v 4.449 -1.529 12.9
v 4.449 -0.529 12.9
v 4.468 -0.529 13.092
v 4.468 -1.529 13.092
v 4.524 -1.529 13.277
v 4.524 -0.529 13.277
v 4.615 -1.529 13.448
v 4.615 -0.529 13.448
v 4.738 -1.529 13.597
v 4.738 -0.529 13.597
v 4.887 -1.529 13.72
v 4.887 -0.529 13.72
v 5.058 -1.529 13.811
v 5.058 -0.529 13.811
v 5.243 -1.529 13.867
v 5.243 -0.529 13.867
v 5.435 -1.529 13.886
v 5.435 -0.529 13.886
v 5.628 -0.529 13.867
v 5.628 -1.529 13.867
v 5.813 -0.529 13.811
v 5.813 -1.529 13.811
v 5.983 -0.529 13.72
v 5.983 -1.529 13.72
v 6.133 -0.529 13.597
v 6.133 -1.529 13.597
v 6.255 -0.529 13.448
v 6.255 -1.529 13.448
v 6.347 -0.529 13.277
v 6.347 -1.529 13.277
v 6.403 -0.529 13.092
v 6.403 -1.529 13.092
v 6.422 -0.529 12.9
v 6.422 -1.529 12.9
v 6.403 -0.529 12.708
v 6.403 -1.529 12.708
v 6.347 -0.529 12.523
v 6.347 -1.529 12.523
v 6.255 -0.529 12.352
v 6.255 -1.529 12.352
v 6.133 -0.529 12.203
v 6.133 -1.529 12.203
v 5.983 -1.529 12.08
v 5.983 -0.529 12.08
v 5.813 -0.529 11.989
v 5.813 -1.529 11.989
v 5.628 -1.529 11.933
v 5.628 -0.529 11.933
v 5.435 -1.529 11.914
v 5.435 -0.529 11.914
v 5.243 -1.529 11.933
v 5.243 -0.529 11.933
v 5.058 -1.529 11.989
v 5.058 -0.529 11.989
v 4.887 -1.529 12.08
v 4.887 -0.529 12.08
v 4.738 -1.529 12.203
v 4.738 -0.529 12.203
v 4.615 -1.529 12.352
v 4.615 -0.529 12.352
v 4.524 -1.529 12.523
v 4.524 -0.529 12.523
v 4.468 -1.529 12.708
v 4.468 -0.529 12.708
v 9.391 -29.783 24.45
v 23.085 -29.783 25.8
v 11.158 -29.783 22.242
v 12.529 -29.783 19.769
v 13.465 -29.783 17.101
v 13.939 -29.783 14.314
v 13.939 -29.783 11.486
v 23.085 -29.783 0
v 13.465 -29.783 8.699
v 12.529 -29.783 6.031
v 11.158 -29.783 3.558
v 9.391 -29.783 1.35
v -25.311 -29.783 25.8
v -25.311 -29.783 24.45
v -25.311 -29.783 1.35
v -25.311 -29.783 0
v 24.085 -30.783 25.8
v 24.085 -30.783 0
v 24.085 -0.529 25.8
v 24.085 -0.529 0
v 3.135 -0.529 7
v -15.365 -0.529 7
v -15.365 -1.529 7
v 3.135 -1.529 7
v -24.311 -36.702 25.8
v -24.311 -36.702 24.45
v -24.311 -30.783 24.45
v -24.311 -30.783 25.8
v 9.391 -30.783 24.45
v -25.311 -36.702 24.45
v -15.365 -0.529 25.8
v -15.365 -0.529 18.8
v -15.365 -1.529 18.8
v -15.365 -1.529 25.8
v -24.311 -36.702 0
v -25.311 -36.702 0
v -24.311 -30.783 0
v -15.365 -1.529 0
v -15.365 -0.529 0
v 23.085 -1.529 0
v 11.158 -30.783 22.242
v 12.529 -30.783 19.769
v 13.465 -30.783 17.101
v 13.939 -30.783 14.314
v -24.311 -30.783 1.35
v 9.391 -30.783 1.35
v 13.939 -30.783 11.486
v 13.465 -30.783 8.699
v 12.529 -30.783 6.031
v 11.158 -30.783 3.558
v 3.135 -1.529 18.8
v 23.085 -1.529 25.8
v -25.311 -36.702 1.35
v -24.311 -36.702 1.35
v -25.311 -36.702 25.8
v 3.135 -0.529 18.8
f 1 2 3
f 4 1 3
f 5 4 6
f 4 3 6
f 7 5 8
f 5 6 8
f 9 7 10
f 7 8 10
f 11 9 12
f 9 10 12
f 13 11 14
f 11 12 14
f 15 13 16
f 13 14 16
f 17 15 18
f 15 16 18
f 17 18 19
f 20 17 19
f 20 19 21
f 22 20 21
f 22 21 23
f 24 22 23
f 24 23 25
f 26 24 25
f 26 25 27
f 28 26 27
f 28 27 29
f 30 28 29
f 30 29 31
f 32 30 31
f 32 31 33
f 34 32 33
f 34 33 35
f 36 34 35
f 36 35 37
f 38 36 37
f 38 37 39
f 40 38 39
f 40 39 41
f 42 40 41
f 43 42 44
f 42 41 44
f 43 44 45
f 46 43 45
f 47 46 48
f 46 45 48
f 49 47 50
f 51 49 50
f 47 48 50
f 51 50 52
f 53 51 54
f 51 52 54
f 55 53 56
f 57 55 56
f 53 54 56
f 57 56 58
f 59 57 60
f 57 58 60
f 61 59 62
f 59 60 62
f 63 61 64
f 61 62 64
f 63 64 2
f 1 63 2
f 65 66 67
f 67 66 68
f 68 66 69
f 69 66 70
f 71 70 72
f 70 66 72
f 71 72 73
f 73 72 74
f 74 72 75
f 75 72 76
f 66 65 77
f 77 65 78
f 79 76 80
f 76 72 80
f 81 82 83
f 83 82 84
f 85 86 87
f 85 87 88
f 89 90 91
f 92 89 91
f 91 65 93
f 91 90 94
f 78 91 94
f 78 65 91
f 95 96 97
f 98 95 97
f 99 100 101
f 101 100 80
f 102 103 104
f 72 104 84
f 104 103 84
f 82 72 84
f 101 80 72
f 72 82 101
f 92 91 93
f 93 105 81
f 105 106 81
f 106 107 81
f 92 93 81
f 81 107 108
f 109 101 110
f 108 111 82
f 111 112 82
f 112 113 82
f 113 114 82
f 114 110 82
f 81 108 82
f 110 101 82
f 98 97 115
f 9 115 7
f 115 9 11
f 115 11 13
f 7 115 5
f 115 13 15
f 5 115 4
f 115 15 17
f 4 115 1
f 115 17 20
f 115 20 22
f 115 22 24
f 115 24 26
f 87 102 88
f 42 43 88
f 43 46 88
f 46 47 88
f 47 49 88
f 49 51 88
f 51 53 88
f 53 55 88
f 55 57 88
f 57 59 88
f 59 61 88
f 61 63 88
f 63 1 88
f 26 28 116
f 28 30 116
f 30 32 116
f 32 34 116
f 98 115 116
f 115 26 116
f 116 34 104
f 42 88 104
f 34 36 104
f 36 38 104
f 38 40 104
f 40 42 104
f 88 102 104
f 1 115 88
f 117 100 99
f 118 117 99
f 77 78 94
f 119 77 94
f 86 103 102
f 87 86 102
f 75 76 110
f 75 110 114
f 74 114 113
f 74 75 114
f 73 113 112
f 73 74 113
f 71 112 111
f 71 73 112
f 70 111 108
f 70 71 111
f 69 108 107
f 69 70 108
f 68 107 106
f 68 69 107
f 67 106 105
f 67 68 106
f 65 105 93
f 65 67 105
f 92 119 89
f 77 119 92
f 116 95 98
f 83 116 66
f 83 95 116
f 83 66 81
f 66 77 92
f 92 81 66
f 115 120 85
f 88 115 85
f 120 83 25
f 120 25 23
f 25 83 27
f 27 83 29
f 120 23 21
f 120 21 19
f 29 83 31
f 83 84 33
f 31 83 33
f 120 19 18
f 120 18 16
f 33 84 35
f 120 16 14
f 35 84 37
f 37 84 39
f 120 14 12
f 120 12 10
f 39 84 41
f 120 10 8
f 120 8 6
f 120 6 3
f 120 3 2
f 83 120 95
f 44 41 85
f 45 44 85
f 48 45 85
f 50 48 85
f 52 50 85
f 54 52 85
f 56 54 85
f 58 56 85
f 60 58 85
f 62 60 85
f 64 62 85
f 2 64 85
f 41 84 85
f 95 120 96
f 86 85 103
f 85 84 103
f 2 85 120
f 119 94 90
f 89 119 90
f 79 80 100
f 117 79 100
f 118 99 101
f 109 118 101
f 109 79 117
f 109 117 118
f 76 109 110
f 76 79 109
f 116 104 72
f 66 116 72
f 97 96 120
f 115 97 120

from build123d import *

# Parameters (mm, degrees)
SALIENTE_EXTRUIR1_DEPTH = 25.8
CORTAR_EXTRUIR1_REACH   = 53.135
CROQUIS2_R              = 0.986321187
CROQUIS2_W              = 18.5
CROQUIS2_H              = 11.8
CORTAR_EXTRUIR2_DEPTH   = 47.498669213


with BuildPart() as part:
    # Croquis1 → Saliente-Extruir1 (new body)
    with BuildSketch(Plane.XY):
        Polygon((-15.36468389, -0.528688711), (-15.36468389, -1.528688711), (23.08488752, -1.528688711), (23.08488752, -29.783472062), (-25.31094407, -29.783472062), (-25.31094407, -36.701823748), (-24.31094407, -36.701823748), (-24.31094407, -30.783472062), (24.08488752, -30.783472062), (24.08488752, -0.528688711), align=None)
    extrude(amount=SALIENTE_EXTRUIR1_DEPTH)

    # Croquis2 → Cortar-Extruir1 (cut, up to next)
    with BuildSketch(Plane(origin=(0, -0.528688711, 0), x_dir=(1, 0, 0), z_dir=(0, 1, 0)), mode=Mode.PRIVATE) as cortar_extruir1_sk1:
        with Locations(Location((5.43531611, -12.9, 0), (0, 0, 180))):
            Circle(CROQUIS2_R)
    cortar_extruir1_tool1 = extrude(cortar_extruir1_sk1.sketch, amount=-CORTAR_EXTRUIR1_REACH, mode=Mode.PRIVATE) & part.part
    # Croquis2 → Cortar-Extruir1 (cut, up to next)
    with BuildSketch(Plane(origin=(0, -0.528688711, 0), x_dir=(1, 0, 0), z_dir=(0, 1, 0)), mode=Mode.PRIVATE) as cortar_extruir1_sk2:
        with Locations((-6.11468389, -12.9)):
            Rectangle(CROQUIS2_W, CROQUIS2_H)
    cortar_extruir1_tool2 = extrude(cortar_extruir1_sk2.sketch, amount=-CORTAR_EXTRUIR1_REACH, mode=Mode.PRIVATE) & part.part
    add(cortar_extruir1_tool1.solids().sort_by_distance((5.435316, -0.528689, 12.9))[0], mode=Mode.SUBTRACT)
    add(cortar_extruir1_tool2.solids().sort_by_distance((-6.114684, -0.528689, 12.9))[0], mode=Mode.SUBTRACT)

    # Croquis3 → Cortar-Extruir2 (cut, through all)
    with BuildSketch(Plane(origin=(0, -29.783472062, 0), x_dir=(1, 0, 0), z_dir=(0, 1, 0))):
        with BuildLine():
            Line((-25.31094407, -1.35), (9.391397529, -1.35))
            ThreePointArc((9.391397529, -1.35), (13.99905593, -12.9), (9.391397529, -24.45))
            Line((9.391397529, -24.45), (-25.31094407, -24.45))
            Line((-25.31094407, -24.45), (-25.31094407, -1.35))
        make_face()
    extrude(amount=-CORTAR_EXTRUIR2_DEPTH, mode=Mode.SUBTRACT)


solid = part.part
